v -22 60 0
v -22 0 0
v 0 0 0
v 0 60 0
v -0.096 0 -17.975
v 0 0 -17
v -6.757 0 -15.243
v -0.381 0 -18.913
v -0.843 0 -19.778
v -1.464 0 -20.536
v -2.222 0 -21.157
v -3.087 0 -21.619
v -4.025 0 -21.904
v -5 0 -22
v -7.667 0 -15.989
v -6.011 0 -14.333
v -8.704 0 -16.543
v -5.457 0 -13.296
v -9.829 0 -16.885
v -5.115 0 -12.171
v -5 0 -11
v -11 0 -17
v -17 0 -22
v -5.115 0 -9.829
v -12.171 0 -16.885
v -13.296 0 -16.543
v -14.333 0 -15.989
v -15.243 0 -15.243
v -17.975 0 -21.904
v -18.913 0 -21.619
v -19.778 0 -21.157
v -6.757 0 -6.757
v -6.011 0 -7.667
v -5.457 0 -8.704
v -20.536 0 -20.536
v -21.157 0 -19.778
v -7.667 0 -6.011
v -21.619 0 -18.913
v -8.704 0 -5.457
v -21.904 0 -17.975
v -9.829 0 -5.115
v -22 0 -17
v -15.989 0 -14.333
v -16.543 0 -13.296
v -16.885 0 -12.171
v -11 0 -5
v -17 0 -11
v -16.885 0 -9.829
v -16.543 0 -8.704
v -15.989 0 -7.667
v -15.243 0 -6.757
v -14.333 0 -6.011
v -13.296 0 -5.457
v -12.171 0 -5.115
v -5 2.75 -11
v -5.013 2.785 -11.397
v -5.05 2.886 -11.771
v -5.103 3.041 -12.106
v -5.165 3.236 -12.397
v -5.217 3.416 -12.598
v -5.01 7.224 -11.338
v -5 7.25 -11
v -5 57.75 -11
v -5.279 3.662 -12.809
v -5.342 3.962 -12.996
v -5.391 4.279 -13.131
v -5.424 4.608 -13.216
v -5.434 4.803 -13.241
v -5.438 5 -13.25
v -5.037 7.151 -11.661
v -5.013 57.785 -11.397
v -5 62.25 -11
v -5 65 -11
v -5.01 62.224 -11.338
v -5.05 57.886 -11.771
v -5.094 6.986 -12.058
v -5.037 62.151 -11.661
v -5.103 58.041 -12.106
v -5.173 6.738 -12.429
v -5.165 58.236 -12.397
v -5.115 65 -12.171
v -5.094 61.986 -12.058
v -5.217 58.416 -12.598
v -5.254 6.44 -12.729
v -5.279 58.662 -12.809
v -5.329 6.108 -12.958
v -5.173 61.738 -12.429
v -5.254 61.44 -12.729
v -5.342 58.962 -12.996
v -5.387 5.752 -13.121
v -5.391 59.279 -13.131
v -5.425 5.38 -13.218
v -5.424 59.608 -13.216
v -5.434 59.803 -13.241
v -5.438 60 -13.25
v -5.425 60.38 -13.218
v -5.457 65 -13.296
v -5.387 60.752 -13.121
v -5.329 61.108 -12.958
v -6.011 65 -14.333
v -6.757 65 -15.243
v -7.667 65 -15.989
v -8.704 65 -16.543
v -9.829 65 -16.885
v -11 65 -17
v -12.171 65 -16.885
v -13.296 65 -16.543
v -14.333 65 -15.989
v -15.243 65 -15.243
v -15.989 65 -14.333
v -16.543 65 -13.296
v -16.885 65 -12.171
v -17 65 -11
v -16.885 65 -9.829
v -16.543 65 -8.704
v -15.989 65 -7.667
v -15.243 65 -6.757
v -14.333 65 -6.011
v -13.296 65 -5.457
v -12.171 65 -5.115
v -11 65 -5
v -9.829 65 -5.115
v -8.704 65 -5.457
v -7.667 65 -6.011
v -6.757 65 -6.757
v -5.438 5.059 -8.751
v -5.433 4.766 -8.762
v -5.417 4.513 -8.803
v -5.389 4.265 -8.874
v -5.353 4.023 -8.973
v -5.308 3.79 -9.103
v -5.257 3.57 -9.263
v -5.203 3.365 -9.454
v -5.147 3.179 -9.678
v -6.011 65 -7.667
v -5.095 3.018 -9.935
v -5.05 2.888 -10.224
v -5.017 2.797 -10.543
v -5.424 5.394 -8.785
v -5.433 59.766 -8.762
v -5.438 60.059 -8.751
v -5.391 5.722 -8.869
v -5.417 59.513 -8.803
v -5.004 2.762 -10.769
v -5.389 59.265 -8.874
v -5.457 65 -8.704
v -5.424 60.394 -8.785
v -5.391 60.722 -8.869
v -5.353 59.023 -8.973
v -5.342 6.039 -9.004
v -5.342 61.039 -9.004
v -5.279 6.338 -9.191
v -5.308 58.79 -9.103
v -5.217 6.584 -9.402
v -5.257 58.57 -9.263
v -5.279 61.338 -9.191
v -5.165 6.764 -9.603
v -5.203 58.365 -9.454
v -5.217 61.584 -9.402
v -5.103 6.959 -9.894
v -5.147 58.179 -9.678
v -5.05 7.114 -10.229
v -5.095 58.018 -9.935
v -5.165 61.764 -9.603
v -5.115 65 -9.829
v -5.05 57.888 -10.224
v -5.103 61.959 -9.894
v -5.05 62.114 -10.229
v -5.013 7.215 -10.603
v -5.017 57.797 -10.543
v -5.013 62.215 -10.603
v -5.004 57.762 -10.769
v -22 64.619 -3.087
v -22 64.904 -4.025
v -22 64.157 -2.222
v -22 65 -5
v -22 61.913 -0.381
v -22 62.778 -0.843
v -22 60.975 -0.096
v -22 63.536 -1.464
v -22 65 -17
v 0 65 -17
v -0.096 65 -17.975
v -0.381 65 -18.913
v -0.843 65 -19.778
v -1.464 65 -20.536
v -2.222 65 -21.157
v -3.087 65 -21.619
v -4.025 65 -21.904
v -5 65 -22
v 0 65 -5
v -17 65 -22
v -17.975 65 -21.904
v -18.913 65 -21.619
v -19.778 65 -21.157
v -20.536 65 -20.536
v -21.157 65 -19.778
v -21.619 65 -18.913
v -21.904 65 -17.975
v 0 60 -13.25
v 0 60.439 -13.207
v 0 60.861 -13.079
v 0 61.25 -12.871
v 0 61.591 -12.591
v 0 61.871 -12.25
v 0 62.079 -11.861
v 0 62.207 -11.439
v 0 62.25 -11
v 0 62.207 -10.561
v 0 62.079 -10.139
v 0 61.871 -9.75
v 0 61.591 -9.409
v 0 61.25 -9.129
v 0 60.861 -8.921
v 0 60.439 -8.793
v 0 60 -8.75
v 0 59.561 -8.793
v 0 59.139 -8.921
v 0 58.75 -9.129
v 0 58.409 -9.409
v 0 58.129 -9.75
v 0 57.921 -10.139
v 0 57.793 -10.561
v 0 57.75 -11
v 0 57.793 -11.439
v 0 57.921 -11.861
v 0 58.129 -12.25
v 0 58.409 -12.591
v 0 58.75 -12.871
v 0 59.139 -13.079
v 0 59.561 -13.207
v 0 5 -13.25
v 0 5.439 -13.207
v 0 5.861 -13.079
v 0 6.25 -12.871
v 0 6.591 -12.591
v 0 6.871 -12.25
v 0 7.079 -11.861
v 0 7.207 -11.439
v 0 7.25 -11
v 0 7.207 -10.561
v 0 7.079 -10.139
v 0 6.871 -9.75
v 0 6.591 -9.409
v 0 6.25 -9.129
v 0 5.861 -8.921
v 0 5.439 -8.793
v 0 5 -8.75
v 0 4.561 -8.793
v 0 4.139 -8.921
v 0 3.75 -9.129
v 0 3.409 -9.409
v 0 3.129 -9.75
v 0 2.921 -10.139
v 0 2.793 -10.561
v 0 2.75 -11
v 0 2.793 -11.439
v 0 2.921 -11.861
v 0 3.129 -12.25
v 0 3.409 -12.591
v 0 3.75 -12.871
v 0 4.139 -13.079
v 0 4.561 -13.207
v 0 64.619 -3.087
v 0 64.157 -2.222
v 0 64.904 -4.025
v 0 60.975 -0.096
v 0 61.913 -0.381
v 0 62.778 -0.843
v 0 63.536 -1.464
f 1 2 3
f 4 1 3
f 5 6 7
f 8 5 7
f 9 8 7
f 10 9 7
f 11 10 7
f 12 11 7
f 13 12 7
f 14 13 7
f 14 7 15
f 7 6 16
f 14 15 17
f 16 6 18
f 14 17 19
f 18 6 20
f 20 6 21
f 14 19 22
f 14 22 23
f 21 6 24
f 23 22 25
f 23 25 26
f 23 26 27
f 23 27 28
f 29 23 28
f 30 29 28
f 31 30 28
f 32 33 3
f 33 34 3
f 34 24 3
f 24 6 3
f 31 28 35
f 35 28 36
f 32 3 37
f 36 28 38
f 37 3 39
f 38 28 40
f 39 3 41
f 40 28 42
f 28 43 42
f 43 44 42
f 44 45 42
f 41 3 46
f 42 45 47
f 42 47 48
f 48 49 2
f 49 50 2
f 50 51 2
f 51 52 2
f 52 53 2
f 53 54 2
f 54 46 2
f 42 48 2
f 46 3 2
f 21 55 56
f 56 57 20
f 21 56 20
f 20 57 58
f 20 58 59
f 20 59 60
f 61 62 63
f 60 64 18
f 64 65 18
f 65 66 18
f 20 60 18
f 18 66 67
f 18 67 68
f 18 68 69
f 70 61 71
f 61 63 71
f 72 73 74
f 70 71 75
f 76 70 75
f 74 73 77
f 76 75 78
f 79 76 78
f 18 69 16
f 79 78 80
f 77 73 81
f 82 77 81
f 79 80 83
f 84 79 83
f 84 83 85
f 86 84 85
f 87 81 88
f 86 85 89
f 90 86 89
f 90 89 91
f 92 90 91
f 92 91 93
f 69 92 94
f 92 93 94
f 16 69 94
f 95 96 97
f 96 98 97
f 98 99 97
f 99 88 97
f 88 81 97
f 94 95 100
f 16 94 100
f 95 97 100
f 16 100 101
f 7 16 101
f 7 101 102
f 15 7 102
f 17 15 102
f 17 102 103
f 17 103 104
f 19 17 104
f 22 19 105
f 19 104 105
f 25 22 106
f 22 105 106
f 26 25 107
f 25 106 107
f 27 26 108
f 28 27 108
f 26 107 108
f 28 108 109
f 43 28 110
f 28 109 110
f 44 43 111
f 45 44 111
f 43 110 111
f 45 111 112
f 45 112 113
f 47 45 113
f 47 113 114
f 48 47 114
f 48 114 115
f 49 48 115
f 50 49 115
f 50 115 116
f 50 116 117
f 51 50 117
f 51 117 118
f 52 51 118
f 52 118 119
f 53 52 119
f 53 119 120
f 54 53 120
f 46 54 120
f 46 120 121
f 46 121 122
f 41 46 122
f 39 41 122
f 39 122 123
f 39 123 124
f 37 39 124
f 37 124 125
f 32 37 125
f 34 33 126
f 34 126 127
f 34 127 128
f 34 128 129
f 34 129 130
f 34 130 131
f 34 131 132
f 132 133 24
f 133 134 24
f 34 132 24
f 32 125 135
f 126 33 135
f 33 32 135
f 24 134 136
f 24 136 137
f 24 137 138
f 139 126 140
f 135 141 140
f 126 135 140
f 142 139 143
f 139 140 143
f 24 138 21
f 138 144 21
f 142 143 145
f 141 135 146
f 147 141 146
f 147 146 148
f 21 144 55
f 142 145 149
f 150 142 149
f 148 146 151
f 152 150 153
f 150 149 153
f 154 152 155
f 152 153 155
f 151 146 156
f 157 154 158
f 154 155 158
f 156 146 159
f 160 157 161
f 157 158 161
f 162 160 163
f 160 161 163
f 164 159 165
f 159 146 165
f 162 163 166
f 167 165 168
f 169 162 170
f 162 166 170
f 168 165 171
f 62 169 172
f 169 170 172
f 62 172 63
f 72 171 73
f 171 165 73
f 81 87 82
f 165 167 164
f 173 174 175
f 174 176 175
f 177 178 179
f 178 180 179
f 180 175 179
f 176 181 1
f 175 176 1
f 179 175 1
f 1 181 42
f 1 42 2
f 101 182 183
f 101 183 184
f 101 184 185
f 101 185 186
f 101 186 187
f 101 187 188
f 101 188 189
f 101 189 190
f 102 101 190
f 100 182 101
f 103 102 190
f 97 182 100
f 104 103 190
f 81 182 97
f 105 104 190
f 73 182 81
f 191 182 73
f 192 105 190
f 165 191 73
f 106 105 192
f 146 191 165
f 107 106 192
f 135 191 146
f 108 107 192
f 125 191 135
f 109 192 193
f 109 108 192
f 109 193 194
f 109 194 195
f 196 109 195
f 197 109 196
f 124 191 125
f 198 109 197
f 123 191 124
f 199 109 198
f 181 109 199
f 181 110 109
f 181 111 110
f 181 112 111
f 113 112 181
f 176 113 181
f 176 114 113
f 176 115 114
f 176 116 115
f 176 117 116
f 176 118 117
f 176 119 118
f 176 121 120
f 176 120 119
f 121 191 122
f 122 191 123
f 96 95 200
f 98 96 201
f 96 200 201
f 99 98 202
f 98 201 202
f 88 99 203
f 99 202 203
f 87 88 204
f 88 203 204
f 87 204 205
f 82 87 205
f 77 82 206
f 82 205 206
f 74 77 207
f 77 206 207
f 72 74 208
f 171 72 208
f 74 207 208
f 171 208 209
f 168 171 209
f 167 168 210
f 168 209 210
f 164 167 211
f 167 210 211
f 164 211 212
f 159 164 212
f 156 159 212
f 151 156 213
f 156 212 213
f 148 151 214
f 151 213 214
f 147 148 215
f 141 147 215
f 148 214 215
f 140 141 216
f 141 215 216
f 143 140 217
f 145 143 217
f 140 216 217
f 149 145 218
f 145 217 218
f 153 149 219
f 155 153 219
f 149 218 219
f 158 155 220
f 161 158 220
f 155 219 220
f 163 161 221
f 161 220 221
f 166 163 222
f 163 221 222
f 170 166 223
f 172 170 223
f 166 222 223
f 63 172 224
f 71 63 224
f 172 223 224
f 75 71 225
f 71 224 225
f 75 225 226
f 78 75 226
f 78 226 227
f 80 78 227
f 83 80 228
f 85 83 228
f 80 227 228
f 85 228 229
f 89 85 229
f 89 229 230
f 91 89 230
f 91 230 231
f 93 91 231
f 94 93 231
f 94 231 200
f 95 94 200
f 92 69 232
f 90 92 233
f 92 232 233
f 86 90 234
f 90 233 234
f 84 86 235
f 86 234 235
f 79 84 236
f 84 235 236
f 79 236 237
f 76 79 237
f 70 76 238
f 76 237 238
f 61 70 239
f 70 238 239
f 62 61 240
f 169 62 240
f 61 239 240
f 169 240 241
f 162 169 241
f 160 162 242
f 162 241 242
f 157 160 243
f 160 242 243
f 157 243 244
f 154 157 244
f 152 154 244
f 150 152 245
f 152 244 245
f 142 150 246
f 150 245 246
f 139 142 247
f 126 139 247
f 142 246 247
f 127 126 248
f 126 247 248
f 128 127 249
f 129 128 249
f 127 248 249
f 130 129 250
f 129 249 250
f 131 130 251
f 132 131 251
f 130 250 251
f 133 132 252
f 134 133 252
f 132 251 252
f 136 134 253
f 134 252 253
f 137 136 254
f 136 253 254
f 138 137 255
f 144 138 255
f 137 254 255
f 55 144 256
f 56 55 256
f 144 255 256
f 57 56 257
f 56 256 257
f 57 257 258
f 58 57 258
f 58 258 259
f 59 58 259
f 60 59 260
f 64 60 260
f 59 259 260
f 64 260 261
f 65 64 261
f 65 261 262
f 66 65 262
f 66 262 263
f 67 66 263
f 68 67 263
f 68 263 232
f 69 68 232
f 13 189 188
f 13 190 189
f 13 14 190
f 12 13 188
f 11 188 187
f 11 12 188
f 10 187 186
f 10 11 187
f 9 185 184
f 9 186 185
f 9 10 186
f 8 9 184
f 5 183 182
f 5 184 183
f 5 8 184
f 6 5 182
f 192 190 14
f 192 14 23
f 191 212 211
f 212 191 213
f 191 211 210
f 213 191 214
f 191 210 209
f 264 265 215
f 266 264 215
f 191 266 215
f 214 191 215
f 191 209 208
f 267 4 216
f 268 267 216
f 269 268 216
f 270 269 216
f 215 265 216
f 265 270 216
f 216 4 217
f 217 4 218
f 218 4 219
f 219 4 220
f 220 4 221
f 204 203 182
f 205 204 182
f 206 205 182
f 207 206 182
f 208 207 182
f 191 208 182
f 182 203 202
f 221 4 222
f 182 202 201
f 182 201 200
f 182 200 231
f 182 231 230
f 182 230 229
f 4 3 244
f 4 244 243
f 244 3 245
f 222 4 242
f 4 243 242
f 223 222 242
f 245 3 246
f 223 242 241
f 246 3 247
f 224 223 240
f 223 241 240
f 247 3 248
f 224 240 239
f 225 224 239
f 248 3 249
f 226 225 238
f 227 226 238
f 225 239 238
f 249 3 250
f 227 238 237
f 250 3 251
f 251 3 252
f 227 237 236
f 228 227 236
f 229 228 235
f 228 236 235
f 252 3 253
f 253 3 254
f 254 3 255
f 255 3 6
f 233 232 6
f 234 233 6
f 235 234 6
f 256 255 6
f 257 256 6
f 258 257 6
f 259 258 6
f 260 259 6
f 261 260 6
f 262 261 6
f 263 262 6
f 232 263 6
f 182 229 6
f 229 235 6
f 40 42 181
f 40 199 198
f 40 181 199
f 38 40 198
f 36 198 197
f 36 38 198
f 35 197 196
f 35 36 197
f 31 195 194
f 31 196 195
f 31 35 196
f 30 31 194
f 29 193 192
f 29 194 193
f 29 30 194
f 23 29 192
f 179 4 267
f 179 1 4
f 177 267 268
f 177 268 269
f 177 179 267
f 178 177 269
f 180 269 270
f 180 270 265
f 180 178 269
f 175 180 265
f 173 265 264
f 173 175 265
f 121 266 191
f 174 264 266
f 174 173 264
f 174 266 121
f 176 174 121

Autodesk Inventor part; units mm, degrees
ref_plane "YZ-Ebene" through (0, 0, 0) normal (1, 0, 0) x (0, 1, 0)
ref_plane "XZ-Ebene" through (0, 0, 0) normal (0, 1, 0) x (-1, 0, 0)
ref_plane "XY-Ebene" through (0, 0, 0) normal (0, 0, 1) x (1, 0, 0)
sketch "Skizze1" plane through (0, 0, 0) normal (0, 1, 0) x (-1, 0, 0)
  line L0 (22, 0) -> (0, 0)
  line L1 (0, 0) -> (0, -17)
  line L2 (5, -22) -> (17, -22)
  line L3 (22, -17) -> (22, 0)
  arc A0 (17, -22) -> (22, -17) centre (17, -17) ccw
  arc A1 (0, -17) -> (5, -22) centre (5, -17) ccw
  point P0 (0, 0)
  point P1 (22, 0)
  point P2 (0, -22)
  point P3 (0, 0)
  point P4 (22, -22)
  point P5 (0, 0)
  point P6 (0, 0)
  point P7 (0, 0)
  point P8 (22, 0)
  point P9 (22, 0)
  point P10 (22, 0)
  point P11 (0, -22)
  point P12 (0, -22)
  point P13 (0, -22)
  point P14 (22, 0)
  dimension "d0" = 22
  dimension "d1" = 22
  dimension "d32" = 5
  dimension "d37" = 5
extrude "Extrusion1" add sketch "Skizze1" along normal blind 65
sketch "Skizze2" plane through (0, 65, 0) normal (0, 1, 0) x (1, 0, 0)
  circle A0 centre (-11, 11) radius 6
  line L0 (-5, 22) -> (-17, 22) projected
  line L1 (0, 0) -> (0, 17) projected
  point P0 (0, 22)
  point P1 (-22, 22)
  point P2 (0, 22)
  dimension "d6" = 12
  dimension "d17" = 11
  dimension "d18" = 11
extrude "Extrusion2" cut sketch "Skizze2" against normal blind 84
sketch "Skizze3" plane through (0, 0, 0) normal (1, 0, 0) x (0, 0, -1)
  circle A0 centre (11, 60) radius 2.25
  circle A1 centre (11, 5) radius 2.25
  line L0 (22, 0) -> (22, 65) projected
  line L1 (0, 0) -> (17, 0) projected
  line L2 (0, 0) -> (0, 84) projected
  point P0 (22, 0)
  dimension "d11" = 5
  dimension "d12" = 55
  dimension "d13" = 4.5
  dimension "d14" = 4.5
  dimension "d28" = 11
  dimension "d29" = 11
extrude "Extrusion3" cut sketch "Skizze3" against normal blind 12
sketch "Skizze6" plane through (-22, 0, -17) normal (-1, 0, 0) x (0, 0, 1)
  line L0 (0, 0) -> (17, 0) projected
  line L1 (0, 65) -> (-5, 65) projected
  line L2 (12, 0) -> (-5, 0)
  line L3 (-5, 0) -> (-5, 65)
  line L4 (-5, 65) -> (12, 65)
  line L5 (17, 60) -> (17, 5)
  arc A0 (17, 60) -> (12, 65) centre (12, 60) ccw
  line L6 (17, 0) -> (-5, 0)
  line L7 (-5, 0) -> (-5, 65)
  line L8 (-5, 65) -> (17, 65)
  line L9 (17, 65) -> (17, 0)
  point P0 (12, 65)
  dimension "d33" = 5
extrude "Extrusion5" cut sketch "Skizze6" against normal blind 25 contours A0 L8 L9
properties part number "microscope_mount"
